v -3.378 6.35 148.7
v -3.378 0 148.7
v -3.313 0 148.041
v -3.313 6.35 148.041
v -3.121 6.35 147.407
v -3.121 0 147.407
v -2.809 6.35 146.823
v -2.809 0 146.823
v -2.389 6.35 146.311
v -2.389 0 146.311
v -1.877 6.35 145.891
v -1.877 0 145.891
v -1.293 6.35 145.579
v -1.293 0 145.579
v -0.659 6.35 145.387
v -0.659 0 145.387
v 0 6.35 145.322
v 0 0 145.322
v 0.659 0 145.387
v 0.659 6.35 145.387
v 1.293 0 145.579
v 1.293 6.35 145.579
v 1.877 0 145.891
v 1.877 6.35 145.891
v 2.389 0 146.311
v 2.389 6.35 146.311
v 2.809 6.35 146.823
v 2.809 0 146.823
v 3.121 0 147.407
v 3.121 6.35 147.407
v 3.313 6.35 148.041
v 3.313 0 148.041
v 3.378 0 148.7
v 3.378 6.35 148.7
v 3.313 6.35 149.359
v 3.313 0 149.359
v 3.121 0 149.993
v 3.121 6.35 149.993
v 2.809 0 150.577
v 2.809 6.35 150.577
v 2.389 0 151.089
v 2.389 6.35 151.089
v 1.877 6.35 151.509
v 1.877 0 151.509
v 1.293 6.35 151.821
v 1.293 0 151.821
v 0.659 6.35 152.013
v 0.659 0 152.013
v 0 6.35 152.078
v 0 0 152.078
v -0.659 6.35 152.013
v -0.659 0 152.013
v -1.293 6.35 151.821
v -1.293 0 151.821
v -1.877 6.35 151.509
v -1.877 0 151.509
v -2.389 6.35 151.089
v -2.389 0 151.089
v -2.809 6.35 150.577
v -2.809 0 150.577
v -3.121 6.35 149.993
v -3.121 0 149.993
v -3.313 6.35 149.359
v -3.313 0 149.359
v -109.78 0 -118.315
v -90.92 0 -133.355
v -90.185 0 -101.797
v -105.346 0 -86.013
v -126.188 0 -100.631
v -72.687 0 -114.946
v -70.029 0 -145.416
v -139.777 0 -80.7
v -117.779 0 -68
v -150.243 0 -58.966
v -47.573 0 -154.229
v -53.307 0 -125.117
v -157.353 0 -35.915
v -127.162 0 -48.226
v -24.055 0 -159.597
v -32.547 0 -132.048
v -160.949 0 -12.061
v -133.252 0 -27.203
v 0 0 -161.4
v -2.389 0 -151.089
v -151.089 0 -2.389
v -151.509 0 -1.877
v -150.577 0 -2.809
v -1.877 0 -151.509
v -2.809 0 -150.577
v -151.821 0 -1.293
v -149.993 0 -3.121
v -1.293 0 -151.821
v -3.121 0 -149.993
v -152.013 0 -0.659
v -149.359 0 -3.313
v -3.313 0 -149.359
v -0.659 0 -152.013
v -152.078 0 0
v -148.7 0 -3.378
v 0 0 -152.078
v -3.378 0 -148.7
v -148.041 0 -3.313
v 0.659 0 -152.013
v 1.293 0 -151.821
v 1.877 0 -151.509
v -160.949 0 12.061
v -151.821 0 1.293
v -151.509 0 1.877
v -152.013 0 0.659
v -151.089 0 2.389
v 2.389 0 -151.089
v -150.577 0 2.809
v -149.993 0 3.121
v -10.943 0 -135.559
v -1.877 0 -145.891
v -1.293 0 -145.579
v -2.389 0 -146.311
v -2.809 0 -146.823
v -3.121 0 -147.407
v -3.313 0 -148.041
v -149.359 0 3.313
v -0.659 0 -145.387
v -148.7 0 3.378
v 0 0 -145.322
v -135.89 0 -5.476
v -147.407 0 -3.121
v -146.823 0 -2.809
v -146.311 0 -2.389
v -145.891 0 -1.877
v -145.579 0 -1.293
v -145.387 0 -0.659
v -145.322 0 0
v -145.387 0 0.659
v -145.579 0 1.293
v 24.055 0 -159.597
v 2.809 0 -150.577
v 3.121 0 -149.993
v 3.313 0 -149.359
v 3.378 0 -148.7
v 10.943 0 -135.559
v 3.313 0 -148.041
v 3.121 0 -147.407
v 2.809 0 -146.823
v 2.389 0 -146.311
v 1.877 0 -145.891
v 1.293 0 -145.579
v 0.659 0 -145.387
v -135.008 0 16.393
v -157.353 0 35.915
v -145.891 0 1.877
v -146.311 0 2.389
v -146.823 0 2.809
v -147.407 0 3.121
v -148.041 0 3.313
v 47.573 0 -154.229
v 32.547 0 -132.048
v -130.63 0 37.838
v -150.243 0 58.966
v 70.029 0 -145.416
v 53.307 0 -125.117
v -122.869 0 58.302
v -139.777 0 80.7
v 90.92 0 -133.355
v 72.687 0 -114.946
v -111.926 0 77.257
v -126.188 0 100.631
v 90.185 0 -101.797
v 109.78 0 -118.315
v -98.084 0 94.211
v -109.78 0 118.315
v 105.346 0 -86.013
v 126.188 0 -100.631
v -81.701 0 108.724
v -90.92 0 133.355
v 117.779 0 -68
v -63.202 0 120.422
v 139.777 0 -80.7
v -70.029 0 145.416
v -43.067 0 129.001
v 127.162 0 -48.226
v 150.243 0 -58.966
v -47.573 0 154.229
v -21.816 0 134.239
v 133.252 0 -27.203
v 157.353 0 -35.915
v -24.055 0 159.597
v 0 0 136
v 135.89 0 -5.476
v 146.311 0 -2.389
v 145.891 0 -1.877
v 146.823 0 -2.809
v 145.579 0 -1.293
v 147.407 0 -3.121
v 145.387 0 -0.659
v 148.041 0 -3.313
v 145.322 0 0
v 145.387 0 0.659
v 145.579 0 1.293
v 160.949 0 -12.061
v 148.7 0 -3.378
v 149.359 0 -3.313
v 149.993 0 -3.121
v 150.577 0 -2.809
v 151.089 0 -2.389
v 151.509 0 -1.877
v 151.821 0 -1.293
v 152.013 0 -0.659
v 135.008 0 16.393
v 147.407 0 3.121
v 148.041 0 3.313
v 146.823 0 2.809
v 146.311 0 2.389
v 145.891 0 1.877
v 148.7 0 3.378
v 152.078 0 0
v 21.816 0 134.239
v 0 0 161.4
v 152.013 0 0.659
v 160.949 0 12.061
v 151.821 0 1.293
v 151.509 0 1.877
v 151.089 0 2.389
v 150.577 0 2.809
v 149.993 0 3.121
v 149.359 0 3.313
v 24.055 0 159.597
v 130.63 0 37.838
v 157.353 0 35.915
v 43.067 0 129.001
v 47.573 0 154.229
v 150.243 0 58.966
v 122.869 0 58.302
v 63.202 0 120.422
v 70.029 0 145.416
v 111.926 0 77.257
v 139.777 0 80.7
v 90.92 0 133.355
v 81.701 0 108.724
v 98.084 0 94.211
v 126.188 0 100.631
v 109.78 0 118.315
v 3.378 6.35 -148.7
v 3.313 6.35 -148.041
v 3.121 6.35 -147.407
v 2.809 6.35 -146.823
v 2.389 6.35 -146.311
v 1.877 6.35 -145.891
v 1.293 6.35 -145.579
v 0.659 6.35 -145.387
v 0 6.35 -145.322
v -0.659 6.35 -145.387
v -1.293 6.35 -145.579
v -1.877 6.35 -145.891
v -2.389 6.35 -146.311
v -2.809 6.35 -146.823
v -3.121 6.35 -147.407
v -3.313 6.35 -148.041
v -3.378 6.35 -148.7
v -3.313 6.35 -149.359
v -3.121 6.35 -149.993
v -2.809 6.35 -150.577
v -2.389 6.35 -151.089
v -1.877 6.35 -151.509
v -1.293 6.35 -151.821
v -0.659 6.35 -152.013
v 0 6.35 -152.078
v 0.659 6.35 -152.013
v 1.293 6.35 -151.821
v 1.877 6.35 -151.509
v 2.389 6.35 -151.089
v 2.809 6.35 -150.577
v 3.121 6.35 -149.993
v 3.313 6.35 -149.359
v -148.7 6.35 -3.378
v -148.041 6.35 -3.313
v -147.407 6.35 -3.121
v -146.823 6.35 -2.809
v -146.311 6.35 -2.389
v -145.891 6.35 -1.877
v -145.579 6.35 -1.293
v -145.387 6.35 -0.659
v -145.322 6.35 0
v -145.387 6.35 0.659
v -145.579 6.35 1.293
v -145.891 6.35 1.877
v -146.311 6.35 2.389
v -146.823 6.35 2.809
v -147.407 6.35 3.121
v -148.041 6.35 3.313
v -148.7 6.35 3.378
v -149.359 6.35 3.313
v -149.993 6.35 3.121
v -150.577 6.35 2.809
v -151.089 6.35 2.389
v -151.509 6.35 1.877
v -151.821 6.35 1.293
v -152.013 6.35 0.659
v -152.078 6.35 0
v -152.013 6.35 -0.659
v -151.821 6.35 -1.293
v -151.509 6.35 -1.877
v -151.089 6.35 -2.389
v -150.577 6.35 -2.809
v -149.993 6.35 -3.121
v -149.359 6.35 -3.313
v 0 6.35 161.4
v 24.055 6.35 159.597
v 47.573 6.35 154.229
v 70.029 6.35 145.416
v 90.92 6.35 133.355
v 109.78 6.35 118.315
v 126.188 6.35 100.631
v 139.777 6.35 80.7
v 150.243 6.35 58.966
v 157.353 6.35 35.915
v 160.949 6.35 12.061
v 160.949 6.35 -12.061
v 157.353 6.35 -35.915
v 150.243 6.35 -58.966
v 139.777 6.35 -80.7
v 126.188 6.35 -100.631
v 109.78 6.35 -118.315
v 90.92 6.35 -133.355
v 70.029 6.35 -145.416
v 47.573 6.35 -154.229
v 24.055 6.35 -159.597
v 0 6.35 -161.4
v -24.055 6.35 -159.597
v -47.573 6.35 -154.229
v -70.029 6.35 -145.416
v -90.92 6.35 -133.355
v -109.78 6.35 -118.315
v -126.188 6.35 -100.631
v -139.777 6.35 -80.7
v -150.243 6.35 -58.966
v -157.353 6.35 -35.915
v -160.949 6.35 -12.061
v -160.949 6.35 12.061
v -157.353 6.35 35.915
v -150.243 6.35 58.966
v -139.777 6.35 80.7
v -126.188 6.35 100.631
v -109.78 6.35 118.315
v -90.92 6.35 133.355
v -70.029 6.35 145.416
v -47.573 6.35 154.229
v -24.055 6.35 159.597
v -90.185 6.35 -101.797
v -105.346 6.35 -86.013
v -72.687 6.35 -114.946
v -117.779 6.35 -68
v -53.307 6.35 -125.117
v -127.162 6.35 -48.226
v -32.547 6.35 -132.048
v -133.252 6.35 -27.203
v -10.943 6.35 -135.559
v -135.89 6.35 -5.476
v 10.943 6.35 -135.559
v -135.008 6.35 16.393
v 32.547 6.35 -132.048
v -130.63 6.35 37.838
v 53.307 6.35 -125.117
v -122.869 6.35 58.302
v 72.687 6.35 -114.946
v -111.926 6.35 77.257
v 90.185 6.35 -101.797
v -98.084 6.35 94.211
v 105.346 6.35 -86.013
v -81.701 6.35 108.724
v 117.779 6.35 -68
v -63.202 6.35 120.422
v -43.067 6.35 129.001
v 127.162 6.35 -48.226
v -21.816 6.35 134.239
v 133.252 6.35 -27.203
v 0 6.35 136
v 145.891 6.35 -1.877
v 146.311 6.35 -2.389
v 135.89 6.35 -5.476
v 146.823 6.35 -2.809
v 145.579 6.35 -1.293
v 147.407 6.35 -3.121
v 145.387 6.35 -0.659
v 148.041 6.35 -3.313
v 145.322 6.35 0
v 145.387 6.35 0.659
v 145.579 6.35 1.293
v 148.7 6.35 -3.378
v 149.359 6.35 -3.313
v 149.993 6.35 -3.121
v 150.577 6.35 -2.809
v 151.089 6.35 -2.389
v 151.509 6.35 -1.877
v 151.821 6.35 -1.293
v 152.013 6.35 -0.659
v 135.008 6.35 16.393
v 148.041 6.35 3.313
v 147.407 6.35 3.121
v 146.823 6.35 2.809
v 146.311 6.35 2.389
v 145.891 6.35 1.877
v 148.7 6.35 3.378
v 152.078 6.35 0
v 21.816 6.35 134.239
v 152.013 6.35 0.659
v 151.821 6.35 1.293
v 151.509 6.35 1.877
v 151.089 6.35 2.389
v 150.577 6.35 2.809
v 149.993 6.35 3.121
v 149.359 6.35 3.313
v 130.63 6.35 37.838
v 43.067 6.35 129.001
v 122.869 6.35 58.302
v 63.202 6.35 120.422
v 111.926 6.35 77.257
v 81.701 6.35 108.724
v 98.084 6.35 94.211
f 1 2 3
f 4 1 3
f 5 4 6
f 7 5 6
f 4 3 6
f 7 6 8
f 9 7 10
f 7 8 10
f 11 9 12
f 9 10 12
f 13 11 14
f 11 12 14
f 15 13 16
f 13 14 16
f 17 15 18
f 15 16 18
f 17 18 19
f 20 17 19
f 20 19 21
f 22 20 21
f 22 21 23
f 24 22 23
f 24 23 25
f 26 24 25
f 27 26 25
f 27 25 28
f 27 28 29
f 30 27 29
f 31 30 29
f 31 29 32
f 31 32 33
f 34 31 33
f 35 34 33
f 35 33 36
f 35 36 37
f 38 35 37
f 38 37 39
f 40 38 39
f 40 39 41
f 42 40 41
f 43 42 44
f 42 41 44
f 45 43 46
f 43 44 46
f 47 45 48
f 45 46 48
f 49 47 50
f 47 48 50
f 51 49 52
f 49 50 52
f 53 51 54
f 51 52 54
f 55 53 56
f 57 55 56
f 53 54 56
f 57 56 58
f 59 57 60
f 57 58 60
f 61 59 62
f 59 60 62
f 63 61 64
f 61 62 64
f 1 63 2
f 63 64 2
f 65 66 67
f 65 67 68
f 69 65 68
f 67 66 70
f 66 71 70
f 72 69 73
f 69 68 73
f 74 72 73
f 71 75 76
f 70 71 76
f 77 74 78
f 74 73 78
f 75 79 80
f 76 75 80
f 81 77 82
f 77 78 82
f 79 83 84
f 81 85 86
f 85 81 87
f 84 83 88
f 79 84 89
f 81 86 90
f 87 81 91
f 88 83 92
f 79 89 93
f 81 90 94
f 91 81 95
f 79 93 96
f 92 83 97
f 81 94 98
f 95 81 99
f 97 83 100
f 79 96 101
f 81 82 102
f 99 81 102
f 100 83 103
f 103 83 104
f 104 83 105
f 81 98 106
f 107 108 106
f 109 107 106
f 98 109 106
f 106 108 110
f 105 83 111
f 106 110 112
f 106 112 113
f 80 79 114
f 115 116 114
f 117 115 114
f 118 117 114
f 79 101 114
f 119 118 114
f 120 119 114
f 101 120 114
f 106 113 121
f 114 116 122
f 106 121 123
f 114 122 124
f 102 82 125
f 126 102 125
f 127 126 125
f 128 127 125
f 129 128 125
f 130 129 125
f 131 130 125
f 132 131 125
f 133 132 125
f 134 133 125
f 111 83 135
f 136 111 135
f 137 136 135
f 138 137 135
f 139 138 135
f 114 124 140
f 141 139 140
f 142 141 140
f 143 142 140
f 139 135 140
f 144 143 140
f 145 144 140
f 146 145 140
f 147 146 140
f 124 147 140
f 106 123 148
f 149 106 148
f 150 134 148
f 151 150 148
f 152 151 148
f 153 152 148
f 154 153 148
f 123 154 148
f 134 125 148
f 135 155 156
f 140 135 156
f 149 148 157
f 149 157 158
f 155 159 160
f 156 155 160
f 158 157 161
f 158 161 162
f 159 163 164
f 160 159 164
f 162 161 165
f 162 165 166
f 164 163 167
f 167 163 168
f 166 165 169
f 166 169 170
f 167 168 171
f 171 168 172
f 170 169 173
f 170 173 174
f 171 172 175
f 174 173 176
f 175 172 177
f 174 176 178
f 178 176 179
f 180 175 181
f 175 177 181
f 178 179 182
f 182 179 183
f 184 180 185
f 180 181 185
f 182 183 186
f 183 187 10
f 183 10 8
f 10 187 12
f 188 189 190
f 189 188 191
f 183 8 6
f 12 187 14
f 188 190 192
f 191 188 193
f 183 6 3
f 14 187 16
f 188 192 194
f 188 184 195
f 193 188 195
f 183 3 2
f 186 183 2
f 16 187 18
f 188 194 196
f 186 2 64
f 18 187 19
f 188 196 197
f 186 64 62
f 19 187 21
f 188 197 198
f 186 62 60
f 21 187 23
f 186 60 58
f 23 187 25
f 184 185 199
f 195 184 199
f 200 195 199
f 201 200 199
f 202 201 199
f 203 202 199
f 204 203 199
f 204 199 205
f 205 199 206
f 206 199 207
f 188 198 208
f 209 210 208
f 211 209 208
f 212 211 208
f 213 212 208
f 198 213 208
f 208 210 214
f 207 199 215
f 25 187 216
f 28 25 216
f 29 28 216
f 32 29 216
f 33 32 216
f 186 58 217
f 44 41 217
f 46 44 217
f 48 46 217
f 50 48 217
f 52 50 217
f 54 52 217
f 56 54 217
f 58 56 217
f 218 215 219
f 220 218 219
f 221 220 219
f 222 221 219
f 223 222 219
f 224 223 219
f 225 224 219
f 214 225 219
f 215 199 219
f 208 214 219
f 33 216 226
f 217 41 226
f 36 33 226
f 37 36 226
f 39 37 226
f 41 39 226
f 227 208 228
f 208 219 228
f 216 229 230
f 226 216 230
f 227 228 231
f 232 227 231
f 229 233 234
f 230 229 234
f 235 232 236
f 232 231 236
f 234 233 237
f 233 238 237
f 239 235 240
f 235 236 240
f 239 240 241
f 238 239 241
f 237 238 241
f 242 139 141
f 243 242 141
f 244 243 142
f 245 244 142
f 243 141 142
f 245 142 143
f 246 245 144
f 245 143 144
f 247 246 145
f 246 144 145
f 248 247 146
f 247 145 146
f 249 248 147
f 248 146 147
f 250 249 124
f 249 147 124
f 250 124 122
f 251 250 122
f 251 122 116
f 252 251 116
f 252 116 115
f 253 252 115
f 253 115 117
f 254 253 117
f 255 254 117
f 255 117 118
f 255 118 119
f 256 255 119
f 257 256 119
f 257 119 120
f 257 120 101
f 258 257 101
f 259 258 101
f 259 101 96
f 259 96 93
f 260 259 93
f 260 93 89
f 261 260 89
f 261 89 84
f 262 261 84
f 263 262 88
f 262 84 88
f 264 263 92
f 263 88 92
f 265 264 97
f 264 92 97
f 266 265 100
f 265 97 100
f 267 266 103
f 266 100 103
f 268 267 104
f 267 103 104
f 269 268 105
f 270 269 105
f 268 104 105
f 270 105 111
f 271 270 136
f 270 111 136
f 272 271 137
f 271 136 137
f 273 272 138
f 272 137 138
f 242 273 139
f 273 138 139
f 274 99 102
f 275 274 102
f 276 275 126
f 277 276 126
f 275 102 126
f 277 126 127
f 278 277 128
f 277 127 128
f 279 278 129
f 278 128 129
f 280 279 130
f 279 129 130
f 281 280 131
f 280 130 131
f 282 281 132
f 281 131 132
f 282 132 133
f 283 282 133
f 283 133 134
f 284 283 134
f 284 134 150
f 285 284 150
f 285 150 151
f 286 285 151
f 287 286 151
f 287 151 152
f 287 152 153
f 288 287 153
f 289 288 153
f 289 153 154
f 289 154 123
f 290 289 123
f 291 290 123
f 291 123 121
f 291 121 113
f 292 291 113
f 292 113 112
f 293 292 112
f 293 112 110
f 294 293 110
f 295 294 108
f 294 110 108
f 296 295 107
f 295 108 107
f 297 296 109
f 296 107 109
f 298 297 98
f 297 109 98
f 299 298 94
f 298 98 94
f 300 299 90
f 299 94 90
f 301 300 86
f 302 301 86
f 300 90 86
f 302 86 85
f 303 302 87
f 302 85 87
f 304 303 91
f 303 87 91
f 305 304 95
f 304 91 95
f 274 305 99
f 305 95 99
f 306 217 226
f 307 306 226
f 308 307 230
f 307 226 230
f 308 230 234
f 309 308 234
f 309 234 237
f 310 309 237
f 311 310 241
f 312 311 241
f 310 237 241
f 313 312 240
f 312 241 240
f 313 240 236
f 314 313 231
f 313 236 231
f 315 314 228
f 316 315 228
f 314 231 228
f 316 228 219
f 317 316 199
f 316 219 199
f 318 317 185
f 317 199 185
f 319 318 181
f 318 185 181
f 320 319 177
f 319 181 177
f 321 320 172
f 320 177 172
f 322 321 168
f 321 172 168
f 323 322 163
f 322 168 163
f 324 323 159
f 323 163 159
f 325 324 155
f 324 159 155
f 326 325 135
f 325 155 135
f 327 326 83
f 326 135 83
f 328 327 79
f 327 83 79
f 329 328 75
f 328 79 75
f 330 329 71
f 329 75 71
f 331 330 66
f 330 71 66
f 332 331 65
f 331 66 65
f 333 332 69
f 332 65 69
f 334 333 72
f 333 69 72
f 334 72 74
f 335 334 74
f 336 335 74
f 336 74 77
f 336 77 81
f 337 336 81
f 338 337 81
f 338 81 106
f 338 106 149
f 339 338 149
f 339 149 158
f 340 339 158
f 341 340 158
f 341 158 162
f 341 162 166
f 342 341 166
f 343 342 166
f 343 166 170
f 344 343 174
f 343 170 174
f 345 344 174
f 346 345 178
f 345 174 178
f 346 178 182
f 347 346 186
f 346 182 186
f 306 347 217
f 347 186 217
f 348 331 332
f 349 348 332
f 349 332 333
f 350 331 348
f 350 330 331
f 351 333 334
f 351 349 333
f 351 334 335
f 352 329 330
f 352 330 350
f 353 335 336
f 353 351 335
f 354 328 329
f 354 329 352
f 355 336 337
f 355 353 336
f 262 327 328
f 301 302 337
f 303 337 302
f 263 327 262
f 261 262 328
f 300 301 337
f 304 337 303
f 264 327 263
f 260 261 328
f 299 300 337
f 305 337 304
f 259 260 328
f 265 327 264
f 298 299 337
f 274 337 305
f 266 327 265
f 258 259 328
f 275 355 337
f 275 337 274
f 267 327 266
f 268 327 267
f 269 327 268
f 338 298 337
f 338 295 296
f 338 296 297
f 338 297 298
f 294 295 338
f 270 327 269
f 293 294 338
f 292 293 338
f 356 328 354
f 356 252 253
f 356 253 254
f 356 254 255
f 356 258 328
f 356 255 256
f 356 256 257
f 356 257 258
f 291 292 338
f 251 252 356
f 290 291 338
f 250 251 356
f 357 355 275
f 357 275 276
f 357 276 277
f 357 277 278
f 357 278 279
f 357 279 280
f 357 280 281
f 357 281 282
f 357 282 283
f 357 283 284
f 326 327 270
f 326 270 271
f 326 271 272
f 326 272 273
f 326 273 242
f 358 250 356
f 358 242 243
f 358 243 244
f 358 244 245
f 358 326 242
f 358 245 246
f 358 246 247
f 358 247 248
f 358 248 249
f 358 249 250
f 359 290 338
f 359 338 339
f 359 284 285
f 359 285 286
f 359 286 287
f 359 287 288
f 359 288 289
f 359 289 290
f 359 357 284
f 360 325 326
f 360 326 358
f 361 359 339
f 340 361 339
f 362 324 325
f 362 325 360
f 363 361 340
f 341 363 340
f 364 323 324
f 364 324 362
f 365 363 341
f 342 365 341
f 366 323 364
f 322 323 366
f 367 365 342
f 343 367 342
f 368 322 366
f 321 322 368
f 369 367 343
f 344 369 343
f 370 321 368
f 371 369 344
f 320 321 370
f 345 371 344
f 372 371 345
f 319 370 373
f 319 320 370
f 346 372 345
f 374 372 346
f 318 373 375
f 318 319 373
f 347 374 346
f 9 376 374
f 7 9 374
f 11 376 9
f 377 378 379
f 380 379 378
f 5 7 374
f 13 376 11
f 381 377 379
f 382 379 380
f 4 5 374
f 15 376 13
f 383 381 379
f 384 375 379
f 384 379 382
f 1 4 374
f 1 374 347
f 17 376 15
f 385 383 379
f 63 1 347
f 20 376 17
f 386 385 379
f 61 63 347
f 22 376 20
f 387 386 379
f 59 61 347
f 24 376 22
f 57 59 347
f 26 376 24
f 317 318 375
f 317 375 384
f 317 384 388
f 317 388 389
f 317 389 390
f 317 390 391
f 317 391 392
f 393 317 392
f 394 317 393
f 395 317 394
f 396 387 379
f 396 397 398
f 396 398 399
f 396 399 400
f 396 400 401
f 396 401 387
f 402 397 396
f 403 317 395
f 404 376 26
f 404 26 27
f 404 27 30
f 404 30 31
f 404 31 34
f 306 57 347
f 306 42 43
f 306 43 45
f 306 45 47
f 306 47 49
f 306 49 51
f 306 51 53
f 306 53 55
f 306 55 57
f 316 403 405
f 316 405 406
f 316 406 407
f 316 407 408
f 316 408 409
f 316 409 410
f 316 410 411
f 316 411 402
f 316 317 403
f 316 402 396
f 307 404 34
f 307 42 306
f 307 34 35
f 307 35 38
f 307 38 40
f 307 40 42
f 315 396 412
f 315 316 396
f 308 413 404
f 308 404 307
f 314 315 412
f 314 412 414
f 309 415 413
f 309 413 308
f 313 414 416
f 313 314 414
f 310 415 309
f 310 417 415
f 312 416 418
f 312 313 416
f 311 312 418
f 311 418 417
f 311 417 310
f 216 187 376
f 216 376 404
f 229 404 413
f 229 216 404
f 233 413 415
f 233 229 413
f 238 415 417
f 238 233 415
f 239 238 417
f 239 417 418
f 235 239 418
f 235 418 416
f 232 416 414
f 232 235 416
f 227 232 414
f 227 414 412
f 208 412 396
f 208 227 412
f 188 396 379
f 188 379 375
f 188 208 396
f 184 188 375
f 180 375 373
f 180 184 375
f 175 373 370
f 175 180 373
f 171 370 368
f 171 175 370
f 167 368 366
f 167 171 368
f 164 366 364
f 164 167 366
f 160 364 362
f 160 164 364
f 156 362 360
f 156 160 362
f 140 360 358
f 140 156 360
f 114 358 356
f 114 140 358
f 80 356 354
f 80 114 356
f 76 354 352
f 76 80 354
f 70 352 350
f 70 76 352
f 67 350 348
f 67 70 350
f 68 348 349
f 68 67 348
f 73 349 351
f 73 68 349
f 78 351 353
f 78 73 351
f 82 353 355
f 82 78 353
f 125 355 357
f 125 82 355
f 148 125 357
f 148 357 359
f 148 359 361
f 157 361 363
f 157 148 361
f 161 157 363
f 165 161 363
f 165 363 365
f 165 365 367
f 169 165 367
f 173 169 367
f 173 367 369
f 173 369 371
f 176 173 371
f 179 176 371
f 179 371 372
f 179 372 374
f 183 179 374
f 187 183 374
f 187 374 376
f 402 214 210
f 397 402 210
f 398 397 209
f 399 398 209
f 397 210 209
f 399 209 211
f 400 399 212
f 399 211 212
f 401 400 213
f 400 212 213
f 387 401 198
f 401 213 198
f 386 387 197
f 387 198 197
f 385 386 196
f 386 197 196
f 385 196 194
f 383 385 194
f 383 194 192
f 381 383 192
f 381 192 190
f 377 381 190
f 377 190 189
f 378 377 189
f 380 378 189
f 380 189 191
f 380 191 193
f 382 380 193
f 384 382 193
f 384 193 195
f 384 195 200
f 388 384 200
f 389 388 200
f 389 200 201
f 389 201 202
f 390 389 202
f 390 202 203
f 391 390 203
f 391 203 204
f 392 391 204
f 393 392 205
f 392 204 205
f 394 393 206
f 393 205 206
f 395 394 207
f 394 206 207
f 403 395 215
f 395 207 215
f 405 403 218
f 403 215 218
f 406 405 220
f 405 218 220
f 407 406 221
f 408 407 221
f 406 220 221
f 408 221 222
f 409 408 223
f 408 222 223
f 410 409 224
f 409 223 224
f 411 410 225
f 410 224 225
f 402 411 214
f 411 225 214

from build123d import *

# Parameters (mm, degrees)
SKETCH1_R               = 161.4
SKETCH1_R_2             = 136
BOSS_EXTRUDE1_DEPTH     = 6.35
F_1_4_CLEARANCE_HOLE1_D = 6.7564
CIRPATTERN1_COUNT       = 4


with BuildPart() as part:
    # Sketch1 → Boss-Extrude1 (new body)
    with BuildSketch(Plane(origin=(0, 0, 0), x_dir=(1, 0, 0), z_dir=(0, 1, 0))):
        with Locations(Location((0, 0, 0), (0, 0, 270))):
            Circle(SKETCH1_R)
        with Locations(Location((0, 0, 0), (0, 0, 270))):
            Circle(SKETCH1_R_2, mode=Mode.SUBTRACT)
    extrude(amount=BOSS_EXTRUDE1_DEPTH)

    # 1/4 Clearance Hole1 (through all)
    with Locations(Plane(origin=(0, 6.35, 0), x_dir=(1, 0, 0), z_dir=(0, 1, 0))):
        with Locations((0, -148.7)):
            f_1_4_clearance_hole1 = Hole(F_1_4_CLEARANCE_HOLE1_D / 2)

    # CirPattern1: 1/4 Clearance Hole1 ×4 about axis
    cirpattern1_axis = Axis((0, 0, 0), (0, 1, 0))
    for i in range(1, CIRPATTERN1_COUNT):
        add(f_1_4_clearance_hole1.rotate(cirpattern1_axis, i * 360 / CIRPATTERN1_COUNT), mode=Mode.SUBTRACT)


solid = part.part
